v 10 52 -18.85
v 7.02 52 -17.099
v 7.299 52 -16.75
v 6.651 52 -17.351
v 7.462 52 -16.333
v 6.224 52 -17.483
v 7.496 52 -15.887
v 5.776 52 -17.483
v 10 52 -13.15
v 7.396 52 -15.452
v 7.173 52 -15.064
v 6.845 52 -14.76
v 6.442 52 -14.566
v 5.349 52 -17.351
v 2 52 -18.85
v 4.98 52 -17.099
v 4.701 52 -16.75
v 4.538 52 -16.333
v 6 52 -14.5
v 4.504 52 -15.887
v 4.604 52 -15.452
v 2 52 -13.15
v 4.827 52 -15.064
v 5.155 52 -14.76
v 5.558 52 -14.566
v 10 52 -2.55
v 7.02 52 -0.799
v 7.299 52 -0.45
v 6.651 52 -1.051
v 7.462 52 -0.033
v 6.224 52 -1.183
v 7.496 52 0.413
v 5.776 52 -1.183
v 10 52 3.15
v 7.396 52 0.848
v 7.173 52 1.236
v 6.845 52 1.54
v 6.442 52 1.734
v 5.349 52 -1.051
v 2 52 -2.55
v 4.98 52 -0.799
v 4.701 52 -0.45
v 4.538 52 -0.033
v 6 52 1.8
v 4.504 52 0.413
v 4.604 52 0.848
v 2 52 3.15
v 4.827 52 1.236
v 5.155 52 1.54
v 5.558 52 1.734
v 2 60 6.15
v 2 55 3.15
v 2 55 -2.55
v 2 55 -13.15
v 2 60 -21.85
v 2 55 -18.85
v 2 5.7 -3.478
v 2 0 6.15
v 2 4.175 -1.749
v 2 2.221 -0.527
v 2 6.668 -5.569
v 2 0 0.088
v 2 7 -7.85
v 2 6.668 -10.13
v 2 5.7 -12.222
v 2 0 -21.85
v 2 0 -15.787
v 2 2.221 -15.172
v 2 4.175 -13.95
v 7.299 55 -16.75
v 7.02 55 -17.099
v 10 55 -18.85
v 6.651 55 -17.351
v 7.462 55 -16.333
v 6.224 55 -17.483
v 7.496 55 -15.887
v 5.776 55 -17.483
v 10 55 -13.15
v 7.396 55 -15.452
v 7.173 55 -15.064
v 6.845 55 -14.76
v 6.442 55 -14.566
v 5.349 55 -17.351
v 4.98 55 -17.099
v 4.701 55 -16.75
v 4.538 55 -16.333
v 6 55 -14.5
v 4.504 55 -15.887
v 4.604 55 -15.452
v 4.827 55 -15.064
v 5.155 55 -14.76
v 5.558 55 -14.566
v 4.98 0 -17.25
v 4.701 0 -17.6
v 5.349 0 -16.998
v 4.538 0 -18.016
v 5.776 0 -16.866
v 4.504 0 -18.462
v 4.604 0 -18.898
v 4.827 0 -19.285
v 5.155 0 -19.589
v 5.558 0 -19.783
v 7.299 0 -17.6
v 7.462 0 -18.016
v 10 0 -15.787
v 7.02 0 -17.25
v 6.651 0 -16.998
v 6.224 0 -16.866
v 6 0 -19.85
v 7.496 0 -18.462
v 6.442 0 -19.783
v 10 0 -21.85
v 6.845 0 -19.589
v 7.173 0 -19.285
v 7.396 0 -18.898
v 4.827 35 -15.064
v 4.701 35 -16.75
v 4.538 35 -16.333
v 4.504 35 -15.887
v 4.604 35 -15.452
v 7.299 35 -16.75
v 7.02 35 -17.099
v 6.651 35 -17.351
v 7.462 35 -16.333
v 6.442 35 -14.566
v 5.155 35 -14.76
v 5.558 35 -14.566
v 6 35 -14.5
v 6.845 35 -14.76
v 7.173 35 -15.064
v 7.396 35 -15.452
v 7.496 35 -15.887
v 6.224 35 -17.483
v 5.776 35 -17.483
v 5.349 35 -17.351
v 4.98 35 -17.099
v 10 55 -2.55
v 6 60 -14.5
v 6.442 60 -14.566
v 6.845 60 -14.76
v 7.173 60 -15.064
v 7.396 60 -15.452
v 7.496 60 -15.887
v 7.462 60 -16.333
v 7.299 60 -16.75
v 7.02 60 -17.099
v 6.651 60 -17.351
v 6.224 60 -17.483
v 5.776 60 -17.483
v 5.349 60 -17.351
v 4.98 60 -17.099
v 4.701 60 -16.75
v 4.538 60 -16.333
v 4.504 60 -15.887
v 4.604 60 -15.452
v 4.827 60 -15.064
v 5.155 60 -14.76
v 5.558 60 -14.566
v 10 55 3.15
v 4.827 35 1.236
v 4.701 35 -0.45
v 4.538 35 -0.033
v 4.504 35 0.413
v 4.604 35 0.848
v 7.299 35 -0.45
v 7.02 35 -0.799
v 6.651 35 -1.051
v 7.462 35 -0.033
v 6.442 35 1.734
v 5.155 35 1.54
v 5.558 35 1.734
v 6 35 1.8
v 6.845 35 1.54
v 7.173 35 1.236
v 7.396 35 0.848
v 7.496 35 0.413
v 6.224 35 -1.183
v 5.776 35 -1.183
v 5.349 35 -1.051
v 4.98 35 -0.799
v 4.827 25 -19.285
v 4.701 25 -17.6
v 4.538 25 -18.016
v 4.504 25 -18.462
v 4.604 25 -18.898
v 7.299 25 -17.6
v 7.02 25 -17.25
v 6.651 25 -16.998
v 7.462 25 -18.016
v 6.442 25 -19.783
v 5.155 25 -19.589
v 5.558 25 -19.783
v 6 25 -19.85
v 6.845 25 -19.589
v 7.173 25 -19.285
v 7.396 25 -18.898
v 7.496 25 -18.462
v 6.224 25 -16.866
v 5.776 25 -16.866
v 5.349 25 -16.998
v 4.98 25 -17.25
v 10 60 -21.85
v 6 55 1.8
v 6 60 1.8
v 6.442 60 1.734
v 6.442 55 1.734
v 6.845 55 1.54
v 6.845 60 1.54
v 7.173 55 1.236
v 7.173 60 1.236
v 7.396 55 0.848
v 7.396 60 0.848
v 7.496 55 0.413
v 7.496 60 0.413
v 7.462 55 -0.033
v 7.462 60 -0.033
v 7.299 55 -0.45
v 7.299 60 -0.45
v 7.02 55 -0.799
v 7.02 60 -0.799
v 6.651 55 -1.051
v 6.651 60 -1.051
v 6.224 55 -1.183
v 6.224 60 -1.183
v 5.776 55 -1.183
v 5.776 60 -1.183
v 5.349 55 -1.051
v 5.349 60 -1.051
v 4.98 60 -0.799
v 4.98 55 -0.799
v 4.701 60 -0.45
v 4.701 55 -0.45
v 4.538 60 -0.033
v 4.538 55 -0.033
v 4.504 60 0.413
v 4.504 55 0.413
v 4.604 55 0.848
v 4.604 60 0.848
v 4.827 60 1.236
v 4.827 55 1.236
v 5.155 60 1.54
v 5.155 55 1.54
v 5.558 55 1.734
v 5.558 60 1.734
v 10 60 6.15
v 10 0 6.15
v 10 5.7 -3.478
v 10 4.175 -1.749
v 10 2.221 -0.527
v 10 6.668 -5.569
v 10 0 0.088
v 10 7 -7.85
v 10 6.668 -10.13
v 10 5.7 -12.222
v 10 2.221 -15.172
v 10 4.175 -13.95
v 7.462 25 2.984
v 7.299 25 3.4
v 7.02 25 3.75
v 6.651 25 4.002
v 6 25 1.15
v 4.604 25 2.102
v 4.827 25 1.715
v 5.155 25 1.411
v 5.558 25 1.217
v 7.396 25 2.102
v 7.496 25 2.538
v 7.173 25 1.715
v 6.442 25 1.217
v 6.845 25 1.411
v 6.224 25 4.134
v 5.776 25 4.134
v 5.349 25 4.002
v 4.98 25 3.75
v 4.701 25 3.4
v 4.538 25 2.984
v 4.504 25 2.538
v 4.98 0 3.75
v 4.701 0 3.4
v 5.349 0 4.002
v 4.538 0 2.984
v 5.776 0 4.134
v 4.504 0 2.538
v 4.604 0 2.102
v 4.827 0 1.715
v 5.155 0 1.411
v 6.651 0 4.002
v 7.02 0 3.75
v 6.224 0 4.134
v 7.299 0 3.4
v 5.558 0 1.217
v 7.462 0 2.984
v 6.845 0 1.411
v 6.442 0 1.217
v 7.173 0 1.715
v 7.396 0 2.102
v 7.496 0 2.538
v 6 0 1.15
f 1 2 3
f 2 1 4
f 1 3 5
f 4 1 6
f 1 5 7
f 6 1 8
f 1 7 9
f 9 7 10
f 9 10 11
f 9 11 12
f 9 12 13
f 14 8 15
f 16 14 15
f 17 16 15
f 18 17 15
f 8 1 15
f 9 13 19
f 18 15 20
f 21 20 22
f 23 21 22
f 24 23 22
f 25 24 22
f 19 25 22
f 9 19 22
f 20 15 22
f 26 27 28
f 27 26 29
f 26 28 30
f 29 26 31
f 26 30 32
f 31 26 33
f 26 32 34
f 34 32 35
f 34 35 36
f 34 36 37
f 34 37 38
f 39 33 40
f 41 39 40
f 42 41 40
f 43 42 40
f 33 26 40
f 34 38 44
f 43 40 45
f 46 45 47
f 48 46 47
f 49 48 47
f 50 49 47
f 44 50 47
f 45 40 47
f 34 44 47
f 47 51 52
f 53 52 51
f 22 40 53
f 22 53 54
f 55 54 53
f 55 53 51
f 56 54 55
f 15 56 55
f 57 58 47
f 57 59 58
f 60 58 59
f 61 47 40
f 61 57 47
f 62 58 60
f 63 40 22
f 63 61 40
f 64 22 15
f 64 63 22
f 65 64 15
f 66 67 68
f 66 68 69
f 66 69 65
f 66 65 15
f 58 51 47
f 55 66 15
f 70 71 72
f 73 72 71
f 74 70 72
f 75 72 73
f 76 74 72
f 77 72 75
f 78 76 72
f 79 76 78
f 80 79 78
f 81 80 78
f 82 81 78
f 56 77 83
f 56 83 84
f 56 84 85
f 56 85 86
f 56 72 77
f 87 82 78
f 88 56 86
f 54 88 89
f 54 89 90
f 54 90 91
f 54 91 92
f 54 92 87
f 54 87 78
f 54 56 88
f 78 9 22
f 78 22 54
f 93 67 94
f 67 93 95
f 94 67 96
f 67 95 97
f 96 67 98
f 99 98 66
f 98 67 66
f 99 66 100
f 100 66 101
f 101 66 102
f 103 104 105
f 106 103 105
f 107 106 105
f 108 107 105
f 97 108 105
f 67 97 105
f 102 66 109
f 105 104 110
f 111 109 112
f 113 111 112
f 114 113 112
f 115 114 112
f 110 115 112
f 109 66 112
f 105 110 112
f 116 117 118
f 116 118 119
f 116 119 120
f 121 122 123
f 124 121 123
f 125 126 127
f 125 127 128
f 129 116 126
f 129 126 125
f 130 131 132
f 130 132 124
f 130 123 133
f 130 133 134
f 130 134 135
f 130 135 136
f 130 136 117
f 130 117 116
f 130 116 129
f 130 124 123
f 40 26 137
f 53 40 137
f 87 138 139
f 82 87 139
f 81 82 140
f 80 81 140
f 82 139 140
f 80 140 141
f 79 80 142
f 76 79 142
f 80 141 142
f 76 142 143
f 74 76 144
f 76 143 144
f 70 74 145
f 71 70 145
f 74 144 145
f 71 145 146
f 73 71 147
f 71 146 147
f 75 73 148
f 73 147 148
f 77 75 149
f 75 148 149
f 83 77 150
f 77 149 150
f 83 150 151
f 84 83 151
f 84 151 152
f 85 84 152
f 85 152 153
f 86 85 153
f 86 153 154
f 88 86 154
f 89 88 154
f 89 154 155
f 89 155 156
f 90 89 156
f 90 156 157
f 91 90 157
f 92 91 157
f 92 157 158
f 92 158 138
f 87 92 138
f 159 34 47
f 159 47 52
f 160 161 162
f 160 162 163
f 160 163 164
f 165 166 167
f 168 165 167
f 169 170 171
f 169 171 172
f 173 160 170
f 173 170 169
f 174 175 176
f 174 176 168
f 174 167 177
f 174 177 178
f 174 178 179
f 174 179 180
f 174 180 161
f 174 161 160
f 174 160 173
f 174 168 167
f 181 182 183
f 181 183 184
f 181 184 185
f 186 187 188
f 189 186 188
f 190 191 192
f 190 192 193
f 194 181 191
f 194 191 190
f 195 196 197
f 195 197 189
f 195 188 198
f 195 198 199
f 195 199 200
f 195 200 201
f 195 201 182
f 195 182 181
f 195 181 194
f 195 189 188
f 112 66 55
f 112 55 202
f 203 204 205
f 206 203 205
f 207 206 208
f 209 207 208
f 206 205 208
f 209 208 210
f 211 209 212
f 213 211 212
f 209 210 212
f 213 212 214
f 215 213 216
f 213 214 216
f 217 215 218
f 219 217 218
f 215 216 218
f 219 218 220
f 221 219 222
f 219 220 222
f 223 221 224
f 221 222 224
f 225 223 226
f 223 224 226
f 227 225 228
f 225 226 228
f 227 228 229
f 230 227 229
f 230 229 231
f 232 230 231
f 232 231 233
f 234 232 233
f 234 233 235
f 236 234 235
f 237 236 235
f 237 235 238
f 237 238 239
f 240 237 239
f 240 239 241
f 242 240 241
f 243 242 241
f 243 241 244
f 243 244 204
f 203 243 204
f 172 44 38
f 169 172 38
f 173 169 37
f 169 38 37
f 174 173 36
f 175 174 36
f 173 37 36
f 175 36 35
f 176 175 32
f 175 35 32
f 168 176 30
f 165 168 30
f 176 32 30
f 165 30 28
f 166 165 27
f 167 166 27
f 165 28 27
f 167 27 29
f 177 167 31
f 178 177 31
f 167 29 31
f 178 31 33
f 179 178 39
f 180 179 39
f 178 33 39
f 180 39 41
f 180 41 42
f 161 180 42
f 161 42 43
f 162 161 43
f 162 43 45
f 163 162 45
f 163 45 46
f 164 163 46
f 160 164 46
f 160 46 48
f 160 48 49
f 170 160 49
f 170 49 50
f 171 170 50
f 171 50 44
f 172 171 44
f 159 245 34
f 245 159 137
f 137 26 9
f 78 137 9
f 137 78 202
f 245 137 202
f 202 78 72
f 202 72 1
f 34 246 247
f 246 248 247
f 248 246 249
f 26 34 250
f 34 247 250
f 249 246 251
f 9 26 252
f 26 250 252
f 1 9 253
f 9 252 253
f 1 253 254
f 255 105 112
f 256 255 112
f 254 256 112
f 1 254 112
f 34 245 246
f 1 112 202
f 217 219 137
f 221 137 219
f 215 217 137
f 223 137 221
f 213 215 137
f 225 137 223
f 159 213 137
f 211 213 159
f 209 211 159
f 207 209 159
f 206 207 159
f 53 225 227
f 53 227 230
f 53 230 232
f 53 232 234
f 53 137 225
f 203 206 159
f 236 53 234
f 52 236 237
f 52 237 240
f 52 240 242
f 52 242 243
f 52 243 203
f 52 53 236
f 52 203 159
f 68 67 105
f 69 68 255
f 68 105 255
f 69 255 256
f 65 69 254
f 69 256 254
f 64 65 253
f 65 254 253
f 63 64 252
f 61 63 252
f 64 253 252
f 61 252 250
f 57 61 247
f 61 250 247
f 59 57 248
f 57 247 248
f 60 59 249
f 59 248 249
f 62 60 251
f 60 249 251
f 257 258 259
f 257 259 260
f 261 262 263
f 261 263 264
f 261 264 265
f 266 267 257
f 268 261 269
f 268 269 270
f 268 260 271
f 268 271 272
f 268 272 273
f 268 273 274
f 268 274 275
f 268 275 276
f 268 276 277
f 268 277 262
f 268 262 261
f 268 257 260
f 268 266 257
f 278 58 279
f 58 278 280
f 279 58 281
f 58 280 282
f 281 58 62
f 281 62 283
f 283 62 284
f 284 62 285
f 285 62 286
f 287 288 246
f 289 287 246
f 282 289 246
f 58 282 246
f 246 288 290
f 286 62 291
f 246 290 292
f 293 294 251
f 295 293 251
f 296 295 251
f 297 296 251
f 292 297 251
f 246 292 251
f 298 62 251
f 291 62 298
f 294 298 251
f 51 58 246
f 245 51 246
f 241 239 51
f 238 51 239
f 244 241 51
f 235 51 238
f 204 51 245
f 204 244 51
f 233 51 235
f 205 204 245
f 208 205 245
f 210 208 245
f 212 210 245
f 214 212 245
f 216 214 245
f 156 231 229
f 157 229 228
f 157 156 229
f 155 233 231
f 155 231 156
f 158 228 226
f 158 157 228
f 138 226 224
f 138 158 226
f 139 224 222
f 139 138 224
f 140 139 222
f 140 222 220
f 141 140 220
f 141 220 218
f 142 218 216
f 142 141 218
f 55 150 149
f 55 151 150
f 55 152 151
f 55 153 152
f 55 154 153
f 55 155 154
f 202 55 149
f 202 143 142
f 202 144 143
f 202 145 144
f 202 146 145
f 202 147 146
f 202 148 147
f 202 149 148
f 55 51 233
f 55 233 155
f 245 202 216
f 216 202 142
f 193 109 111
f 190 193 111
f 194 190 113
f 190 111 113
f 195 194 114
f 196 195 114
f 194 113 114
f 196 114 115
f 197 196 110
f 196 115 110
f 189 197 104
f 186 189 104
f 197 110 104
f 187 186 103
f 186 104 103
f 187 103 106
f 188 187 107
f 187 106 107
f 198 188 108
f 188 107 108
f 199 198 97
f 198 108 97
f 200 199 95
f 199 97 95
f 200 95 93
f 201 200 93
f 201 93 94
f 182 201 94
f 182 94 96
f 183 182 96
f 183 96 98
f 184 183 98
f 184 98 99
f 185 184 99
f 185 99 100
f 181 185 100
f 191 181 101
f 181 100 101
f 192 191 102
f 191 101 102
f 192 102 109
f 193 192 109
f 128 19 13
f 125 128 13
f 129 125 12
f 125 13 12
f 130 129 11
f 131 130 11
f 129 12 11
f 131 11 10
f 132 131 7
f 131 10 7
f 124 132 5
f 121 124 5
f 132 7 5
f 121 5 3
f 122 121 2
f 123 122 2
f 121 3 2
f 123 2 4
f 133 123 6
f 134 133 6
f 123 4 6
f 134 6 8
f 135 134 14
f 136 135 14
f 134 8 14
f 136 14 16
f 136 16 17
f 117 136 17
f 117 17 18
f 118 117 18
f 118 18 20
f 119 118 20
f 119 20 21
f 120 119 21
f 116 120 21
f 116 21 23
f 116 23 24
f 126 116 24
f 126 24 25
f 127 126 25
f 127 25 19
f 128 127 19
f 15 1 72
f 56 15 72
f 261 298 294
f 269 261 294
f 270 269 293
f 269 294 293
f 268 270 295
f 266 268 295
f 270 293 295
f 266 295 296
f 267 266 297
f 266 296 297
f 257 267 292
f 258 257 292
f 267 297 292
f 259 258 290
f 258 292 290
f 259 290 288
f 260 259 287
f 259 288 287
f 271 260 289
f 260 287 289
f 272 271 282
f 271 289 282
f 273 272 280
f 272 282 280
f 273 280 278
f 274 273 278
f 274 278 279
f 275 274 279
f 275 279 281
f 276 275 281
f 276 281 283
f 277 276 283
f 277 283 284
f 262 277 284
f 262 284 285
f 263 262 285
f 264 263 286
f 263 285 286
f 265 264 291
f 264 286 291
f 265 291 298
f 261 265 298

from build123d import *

# Parameters (mm, degrees)
SKETCH1_W           = 8
SKETCH1_H           = 28
BOSS_EXTRUDE2_DEPTH = 60
CUT_EXTRUDE2_DEPTH  = 65.353734654
SKETCH6_R           = 1.5
CUT_EXTRUDE3_DEPTH  = 25
SKETCH7_W           = 5.7
SKETCH7_H           = 3
CUT_EXTRUDE4_DEPTH  = 65.353734654
SKETCH8_R           = 1.5
CUT_EXTRUDE5_DEPTH  = 25


with BuildPart() as part:
    # Sketch1 → Boss-Extrude2 (new body)
    with BuildSketch(Plane(origin=(0, 0, 0), x_dir=(1, 0, 0), z_dir=(0, 1, 0))):
        with Locations((6, 7.849557522)):
            Rectangle(SKETCH1_W, SKETCH1_H)
    extrude(amount=BOSS_EXTRUDE2_DEPTH)

    # Sketch5 → Cut-Extrude2 (cut, through all)
    with BuildSketch(Plane(origin=(10, 0, 0), x_dir=(0, 0, -1), z_dir=(1, 0, 0))):
        with BuildLine():
            Line((-0.087696411, 0), (15.786811455, 0))
            ThreePointArc((15.786811455, 0), (7.849557522, 7), (-0.087696411, 0))
        make_face()
    extrude(amount=-CUT_EXTRUDE2_DEPTH, mode=Mode.SUBTRACT)

    # Sketch6 → Cut-Extrude3 (cut)
    with BuildSketch(Plane.XZ):
        with Locations(Location((6, -18.349557522, 0), (0, 0, 270))):
            Circle(SKETCH6_R)
        with Locations(Location((6, 2.650442478, 0), (0, 0, 270))):
            Circle(SKETCH6_R)
    extrude(amount=-CUT_EXTRUDE3_DEPTH, mode=Mode.SUBTRACT)

    # Sketch7 → Cut-Extrude4 (cut, through all)
    with BuildSketch(Plane.ZY.offset(-2)):
        with Locations((-15.999557522, 53.5)):
            Rectangle(SKETCH7_W, SKETCH7_H)
        with Locations((0.300442478, 53.5)):
            Rectangle(SKETCH7_W, SKETCH7_H)
    extrude(amount=-CUT_EXTRUDE4_DEPTH, mode=Mode.SUBTRACT)

    # Sketch8 → Cut-Extrude5 (cut)
    with BuildSketch(Plane(origin=(0, 60, 0), x_dir=(1, 0, 0), z_dir=(0, 1, 0))):
        with Locations(Location((6, 15.999557522, 0), (0, 0, 270))):
            Circle(SKETCH8_R)
        with Locations(Location((6, -0.300442478, 0), (0, 0, 270))):
            Circle(SKETCH8_R)
    extrude(amount=-CUT_EXTRUDE5_DEPTH, mode=Mode.SUBTRACT)


solid = part.part
